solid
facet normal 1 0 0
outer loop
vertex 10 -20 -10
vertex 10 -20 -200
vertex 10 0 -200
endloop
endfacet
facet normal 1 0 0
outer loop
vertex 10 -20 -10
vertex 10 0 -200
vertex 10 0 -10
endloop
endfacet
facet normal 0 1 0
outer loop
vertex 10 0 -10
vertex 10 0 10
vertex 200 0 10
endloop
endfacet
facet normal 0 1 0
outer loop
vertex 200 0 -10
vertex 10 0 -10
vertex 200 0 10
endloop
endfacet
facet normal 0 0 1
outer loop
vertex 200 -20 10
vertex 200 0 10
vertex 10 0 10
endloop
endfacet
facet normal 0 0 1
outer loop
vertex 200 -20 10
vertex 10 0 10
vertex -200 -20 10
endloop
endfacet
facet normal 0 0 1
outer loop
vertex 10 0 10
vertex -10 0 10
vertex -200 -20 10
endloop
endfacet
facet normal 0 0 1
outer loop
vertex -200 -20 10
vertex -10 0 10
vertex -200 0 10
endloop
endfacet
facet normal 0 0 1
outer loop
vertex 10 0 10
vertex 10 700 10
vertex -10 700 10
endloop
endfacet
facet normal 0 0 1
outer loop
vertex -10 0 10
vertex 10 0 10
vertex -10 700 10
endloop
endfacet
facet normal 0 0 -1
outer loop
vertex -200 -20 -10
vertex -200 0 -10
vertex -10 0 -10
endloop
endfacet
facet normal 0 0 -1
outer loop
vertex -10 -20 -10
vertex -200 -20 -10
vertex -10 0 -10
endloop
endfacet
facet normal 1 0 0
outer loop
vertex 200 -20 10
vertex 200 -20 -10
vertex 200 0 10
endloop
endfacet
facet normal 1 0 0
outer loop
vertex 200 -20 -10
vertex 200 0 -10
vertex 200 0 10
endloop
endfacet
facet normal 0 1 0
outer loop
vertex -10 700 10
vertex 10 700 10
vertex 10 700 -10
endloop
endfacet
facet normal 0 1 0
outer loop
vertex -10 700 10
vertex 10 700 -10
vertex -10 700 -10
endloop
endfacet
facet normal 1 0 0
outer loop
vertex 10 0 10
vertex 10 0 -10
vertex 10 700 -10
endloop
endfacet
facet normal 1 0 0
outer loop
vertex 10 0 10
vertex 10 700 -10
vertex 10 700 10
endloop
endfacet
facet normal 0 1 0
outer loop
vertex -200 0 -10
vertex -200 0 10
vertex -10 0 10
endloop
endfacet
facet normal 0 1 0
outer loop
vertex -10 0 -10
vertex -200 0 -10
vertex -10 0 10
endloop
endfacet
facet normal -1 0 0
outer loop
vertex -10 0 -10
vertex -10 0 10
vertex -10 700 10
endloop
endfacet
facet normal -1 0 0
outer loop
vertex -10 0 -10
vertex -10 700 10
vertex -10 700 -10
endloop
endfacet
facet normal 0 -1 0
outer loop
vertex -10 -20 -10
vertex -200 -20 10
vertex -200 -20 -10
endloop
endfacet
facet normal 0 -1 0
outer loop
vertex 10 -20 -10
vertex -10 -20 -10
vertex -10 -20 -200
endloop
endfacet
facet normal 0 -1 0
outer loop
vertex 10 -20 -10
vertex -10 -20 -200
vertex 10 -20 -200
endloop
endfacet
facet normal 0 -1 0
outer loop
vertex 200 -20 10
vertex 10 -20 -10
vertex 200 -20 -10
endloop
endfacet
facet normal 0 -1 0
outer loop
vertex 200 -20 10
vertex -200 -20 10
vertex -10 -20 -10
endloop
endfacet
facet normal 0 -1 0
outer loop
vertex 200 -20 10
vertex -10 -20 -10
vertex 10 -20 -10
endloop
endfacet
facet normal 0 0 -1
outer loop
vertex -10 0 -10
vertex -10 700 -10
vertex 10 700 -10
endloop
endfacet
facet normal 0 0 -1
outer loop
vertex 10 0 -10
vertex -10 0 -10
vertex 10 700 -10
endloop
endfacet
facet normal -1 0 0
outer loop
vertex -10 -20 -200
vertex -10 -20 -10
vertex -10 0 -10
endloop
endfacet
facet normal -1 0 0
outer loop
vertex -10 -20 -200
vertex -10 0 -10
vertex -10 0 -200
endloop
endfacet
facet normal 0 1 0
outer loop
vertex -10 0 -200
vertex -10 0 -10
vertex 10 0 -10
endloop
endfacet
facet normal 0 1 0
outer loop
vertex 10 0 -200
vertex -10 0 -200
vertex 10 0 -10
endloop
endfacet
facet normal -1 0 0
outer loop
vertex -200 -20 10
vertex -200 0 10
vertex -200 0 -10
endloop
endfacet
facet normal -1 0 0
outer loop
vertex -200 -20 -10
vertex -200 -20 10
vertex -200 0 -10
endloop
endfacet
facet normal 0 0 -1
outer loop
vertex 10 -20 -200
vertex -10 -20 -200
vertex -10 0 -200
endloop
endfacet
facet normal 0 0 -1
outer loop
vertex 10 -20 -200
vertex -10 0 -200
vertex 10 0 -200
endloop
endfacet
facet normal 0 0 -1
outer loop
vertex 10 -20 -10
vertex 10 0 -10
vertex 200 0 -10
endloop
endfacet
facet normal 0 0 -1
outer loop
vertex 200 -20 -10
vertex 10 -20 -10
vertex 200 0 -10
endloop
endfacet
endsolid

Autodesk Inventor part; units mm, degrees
ref_plane "YZ Plane" through (0, 0, 0) normal (1, 0, 0) x (0, 1, 0)
ref_plane "XZ Plane" through (0, 0, 0) normal (0, 1, 0) x (-1, 0, 0)
ref_plane "XY Plane" through (0, 0, 0) normal (0, 0, 1) x (1, 0, 0)
sketch "Sketch1" plane through (0, 0, 0) normal (0, 1, 0) x (-1, 0, 0)
  line L0 (10, -10) -> (-10, -10)
  line L1 (-10, -10) -> (-10, 10)
  line L2 (-10, 10) -> (10, 10)
  line L3 (10, 10) -> (10, -10)
  line L4 (10, -10) -> (-10, 10) construction
  line L5 (-10, -10) -> (10, 10) construction
  point P0 (0, 0)
  dimension "d0" = 20
  dimension "d1" = 20
extrude "Extrusion1" add sketch "Sketch1" along normal blind 700
sketch "Sketch2" plane through (0, 0, 0) normal (0, -1, 0) x (1, 0, 0)
  line L0 (-200, -10) -> (200, -10)
  line L1 (200, -10) -> (200, 10)
  line L2 (200, 10) -> (-200, 10)
  line L3 (-200, 10) -> (-200, -10)
  line L4 (-200, -10) -> (200, 10) construction
  line L5 (200, -10) -> (-200, 10) construction
  point P0 (0, 0)
  dimension "d4" = 400
  dimension "d5" = 20
extrude "Extrusion2" add sketch "Sketch2" along normal blind 20
sketch "Sketch3" plane through (0, -20, 0) normal (0, -1, 0) x (1, 0, 0)
  line L0 (-200, 10) -> (-200, -10) projected
  line L1 (-200, -10) -> (200, -10) projected
  line L2 (200, -10) -> (200, 10) projected
  line L3 (200, 10) -> (-200, 10) projected
  line L4 (0, 0) -> (0, -200)
  line L5 (10, 0) -> (-10, 0)
  line L6 (-10, 0) -> (-10, -200)
  line L7 (-10, -200) -> (10, -200)
  line L8 (10, -200) -> (10, 0)
  line L9 (10, 0) -> (-10, -200) construction
  line L10 (-10, 0) -> (10, -200) construction
  point P0 (0, -100)
  point P1 (10, -10)
  point P2 (-10, -10)
  dimension "d8" = 200
  dimension "d9" = 20
  dimension "d10" = 200
extrude "Extrusion3" add sketch "Sketch3" against normal blind 20 contours L1 L4 L7 L6 | L1 L8 L7 L4
properties part number "leg_sim_stand"
